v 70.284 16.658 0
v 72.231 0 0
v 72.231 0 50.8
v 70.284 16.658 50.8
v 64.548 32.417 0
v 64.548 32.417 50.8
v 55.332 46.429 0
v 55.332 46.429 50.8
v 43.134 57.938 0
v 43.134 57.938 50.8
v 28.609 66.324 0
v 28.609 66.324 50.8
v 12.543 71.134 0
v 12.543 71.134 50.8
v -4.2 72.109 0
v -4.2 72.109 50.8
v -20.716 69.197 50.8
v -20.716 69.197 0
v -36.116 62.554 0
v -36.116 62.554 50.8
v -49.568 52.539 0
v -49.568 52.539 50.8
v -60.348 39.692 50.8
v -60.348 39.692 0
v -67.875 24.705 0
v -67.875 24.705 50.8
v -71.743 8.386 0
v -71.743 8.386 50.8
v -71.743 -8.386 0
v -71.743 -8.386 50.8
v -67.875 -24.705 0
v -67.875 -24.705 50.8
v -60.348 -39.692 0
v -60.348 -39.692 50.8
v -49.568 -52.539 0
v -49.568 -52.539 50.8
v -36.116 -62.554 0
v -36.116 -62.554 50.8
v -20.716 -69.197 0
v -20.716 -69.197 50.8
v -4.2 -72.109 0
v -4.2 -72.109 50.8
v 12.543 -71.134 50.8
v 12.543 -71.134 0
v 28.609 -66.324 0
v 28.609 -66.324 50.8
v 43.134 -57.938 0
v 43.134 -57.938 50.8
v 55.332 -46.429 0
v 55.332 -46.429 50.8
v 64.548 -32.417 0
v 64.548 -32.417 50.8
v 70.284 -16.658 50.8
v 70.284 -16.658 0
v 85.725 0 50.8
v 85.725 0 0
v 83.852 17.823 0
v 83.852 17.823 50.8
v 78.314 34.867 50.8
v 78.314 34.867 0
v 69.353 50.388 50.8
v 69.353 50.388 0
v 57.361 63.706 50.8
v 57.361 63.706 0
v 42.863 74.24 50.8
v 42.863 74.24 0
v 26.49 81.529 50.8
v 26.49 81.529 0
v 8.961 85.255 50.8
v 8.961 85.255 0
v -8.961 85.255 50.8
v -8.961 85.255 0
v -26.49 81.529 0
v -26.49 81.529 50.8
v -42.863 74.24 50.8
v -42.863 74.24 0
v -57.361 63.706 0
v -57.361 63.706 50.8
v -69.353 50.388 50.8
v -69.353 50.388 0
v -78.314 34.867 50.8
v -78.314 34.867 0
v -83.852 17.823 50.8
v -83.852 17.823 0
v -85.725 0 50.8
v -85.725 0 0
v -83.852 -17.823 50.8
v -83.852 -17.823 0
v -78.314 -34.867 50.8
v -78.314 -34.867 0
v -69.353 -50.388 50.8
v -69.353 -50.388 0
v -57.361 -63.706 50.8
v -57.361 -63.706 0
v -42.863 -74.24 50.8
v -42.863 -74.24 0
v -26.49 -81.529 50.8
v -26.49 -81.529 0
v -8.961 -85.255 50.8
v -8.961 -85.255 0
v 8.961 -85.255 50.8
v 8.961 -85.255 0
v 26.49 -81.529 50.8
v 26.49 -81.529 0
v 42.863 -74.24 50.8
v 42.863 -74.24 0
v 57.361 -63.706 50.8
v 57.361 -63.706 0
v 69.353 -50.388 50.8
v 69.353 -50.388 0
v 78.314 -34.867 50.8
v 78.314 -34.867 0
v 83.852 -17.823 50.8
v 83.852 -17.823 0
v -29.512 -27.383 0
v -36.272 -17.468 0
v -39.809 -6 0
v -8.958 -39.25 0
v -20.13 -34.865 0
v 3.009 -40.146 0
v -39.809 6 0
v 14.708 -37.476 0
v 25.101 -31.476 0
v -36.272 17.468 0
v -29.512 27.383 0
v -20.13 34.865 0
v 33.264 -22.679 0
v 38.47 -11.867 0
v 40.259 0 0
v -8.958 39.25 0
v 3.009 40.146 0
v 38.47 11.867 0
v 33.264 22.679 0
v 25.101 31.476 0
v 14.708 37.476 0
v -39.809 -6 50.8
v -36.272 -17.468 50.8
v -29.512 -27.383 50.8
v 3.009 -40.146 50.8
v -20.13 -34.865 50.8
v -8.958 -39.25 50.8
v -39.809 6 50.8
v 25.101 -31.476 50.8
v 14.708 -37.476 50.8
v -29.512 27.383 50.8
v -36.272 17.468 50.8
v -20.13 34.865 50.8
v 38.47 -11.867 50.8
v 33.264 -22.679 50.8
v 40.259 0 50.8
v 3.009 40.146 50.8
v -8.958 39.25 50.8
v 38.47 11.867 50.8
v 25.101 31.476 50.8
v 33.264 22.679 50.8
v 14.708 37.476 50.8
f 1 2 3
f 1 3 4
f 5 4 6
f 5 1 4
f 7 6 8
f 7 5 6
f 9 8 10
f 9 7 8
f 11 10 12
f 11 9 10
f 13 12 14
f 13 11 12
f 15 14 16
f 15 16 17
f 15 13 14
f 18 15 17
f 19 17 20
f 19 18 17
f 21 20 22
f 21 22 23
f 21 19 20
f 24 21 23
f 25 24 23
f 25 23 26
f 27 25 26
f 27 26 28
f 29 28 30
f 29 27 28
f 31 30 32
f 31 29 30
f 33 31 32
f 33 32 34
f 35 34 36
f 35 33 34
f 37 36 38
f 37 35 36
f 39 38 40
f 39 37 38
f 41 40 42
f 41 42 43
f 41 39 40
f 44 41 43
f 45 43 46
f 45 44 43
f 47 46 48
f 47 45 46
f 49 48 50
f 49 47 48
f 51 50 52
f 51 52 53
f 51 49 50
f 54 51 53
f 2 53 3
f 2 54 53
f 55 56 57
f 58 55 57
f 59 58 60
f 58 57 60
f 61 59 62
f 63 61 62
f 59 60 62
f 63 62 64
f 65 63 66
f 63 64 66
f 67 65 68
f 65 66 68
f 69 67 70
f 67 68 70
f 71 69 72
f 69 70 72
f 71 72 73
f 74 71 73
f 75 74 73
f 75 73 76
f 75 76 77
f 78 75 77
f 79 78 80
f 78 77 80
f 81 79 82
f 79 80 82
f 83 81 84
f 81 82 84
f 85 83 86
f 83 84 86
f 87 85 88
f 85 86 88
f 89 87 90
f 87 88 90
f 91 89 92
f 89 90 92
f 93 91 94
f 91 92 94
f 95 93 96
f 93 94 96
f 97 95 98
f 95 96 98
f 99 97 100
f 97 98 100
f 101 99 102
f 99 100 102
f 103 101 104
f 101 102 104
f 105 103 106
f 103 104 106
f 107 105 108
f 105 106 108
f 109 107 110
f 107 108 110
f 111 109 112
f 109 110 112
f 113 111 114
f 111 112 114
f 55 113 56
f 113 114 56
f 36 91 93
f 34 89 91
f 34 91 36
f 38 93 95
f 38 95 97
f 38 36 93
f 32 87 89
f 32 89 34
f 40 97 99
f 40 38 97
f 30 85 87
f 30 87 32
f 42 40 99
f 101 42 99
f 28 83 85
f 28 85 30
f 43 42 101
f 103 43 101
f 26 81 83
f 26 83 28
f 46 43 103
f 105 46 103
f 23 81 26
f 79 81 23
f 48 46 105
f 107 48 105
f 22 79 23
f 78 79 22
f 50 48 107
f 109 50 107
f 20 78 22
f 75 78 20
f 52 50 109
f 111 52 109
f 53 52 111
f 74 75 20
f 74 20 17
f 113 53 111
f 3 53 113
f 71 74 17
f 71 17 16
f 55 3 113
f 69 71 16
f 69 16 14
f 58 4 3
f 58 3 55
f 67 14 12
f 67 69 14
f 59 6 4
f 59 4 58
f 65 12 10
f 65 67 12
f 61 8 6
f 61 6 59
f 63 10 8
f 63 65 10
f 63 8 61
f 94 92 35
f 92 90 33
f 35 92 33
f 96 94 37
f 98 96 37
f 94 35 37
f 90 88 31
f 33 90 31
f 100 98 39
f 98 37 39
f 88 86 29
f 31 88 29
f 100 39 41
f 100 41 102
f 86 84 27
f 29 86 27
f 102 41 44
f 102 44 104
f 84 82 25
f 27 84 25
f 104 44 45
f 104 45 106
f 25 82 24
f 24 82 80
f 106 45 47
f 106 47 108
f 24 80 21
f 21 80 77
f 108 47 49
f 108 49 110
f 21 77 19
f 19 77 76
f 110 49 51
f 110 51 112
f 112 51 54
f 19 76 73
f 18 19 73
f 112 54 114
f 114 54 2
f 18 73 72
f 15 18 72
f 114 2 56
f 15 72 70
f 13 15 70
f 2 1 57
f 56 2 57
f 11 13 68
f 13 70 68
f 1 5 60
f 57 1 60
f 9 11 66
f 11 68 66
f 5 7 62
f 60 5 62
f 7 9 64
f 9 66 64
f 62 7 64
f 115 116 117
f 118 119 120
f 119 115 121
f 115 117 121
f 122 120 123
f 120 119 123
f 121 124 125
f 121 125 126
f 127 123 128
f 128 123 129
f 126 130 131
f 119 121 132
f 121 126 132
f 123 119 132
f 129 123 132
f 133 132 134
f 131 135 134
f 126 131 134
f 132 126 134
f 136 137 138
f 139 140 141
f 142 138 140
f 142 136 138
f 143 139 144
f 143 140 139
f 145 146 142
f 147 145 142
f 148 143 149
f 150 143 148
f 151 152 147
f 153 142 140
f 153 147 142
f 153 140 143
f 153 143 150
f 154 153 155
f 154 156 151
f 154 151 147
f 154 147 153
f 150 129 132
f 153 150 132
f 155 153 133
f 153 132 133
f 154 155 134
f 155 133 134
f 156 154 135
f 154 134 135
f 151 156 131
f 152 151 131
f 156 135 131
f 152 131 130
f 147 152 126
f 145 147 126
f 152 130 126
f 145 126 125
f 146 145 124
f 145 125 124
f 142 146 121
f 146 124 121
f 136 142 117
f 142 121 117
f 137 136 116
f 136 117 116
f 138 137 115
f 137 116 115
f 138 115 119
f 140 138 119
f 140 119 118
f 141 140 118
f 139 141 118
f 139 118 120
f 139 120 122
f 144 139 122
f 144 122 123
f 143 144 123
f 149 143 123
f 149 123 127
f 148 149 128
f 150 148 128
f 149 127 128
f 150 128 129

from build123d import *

# Parameters (mm, degrees)
SKETCH1_R             = 85.725
SKETCH1_R_2           = 72.23125
BOSS_EXTRUDE1_DEPTH   = 50.8
SKETCH1_R_3           = 40.259
BOSS_EXTRUDE1_2_DEPTH = 50.8


with BuildPart() as part:
    # Sketch1 → Boss-Extrude1 (new body)
    with BuildSketch(Plane.XY):
        Circle(SKETCH1_R)
        Circle(SKETCH1_R_2, mode=Mode.SUBTRACT)
    extrude(amount=BOSS_EXTRUDE1_DEPTH)


with BuildPart() as body_2:
    # Sketch1 → Boss-Extrude1 2 (new body)
    with BuildSketch(Plane.XY):
        Circle(SKETCH1_R_3)
    extrude(amount=BOSS_EXTRUDE1_2_DEPTH)


solid = Compound([part.part, body_2.part])
